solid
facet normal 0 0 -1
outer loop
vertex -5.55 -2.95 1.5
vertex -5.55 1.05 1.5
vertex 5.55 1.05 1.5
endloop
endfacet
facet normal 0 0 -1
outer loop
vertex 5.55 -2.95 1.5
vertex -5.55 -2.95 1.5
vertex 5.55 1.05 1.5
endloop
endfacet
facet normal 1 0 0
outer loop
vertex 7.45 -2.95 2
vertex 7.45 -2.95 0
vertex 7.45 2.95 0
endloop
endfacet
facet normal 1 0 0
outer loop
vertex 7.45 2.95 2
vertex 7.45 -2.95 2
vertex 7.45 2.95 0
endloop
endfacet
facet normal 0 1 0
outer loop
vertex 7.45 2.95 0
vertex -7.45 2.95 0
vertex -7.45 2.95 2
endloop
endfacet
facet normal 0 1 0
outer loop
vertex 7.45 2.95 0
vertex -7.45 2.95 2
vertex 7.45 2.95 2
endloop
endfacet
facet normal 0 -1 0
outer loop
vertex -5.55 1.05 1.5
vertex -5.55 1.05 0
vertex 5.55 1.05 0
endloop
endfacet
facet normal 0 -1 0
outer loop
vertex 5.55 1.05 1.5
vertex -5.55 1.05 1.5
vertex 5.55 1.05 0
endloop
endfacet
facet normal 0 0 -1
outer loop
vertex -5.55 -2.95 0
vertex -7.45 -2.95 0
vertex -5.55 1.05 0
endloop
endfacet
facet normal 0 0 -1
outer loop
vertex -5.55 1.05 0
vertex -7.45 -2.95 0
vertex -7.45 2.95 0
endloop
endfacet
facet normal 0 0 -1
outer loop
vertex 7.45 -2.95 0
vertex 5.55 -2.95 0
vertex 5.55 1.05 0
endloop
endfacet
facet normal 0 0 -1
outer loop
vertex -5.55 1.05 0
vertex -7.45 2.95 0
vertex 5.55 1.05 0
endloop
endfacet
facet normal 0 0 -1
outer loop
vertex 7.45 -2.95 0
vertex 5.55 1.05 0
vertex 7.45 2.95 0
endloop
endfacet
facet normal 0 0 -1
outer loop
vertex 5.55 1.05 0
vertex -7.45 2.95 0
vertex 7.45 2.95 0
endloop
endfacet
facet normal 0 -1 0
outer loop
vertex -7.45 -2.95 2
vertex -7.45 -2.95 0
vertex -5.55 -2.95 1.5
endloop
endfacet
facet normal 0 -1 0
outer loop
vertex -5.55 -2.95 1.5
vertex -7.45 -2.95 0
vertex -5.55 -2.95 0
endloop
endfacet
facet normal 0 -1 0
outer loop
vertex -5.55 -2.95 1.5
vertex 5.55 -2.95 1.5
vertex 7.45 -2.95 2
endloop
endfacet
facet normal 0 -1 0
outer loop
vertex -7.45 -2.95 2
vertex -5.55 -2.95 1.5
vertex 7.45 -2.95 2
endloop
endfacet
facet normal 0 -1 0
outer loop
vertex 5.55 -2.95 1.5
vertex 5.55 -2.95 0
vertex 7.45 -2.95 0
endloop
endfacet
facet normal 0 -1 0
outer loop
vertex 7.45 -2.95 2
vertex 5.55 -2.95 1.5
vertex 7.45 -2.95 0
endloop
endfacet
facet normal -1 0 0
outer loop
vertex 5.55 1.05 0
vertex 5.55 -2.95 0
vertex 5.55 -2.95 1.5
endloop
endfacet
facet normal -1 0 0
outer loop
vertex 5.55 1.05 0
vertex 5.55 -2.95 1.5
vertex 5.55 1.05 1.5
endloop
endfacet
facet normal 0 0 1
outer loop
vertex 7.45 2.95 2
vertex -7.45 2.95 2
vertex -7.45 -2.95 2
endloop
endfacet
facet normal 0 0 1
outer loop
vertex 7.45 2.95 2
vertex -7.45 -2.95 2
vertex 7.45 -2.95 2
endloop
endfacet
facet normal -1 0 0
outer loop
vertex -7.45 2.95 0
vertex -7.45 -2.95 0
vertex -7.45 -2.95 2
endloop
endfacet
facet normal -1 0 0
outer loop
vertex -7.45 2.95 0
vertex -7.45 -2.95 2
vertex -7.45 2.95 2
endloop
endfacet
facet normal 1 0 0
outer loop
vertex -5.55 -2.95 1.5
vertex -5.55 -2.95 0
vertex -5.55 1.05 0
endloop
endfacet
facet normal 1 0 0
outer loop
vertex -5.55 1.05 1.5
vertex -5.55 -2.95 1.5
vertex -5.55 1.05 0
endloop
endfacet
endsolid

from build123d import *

# Parameters (mm, degrees)
SKETCH001_W  = 11.1
SKETCH001_H  = 4
PAD001_DEPTH = 1.5
SKETCH_W     = 14.9
SKETCH_H     = 5.9
PAD_DEPTH    = 2


with BuildPart() as wyciecie:
    # Sketch001 → Pad001 (new body)
    with BuildSketch(Plane.XY):
        with Locations((0, -0.95)):
            Rectangle(SKETCH001_W, SKETCH001_H)
    extrude(amount=PAD001_DEPTH)


with BuildPart() as cut:
    # Sketch → Pad (new body)
    with BuildSketch(Plane.XY):
        Rectangle(SKETCH_W, SKETCH_H)
    extrude(amount=PAD_DEPTH)

    # Cut: cut wyciecie
    add(wyciecie.part, mode=Mode.SUBTRACT)


solid = cut.part
